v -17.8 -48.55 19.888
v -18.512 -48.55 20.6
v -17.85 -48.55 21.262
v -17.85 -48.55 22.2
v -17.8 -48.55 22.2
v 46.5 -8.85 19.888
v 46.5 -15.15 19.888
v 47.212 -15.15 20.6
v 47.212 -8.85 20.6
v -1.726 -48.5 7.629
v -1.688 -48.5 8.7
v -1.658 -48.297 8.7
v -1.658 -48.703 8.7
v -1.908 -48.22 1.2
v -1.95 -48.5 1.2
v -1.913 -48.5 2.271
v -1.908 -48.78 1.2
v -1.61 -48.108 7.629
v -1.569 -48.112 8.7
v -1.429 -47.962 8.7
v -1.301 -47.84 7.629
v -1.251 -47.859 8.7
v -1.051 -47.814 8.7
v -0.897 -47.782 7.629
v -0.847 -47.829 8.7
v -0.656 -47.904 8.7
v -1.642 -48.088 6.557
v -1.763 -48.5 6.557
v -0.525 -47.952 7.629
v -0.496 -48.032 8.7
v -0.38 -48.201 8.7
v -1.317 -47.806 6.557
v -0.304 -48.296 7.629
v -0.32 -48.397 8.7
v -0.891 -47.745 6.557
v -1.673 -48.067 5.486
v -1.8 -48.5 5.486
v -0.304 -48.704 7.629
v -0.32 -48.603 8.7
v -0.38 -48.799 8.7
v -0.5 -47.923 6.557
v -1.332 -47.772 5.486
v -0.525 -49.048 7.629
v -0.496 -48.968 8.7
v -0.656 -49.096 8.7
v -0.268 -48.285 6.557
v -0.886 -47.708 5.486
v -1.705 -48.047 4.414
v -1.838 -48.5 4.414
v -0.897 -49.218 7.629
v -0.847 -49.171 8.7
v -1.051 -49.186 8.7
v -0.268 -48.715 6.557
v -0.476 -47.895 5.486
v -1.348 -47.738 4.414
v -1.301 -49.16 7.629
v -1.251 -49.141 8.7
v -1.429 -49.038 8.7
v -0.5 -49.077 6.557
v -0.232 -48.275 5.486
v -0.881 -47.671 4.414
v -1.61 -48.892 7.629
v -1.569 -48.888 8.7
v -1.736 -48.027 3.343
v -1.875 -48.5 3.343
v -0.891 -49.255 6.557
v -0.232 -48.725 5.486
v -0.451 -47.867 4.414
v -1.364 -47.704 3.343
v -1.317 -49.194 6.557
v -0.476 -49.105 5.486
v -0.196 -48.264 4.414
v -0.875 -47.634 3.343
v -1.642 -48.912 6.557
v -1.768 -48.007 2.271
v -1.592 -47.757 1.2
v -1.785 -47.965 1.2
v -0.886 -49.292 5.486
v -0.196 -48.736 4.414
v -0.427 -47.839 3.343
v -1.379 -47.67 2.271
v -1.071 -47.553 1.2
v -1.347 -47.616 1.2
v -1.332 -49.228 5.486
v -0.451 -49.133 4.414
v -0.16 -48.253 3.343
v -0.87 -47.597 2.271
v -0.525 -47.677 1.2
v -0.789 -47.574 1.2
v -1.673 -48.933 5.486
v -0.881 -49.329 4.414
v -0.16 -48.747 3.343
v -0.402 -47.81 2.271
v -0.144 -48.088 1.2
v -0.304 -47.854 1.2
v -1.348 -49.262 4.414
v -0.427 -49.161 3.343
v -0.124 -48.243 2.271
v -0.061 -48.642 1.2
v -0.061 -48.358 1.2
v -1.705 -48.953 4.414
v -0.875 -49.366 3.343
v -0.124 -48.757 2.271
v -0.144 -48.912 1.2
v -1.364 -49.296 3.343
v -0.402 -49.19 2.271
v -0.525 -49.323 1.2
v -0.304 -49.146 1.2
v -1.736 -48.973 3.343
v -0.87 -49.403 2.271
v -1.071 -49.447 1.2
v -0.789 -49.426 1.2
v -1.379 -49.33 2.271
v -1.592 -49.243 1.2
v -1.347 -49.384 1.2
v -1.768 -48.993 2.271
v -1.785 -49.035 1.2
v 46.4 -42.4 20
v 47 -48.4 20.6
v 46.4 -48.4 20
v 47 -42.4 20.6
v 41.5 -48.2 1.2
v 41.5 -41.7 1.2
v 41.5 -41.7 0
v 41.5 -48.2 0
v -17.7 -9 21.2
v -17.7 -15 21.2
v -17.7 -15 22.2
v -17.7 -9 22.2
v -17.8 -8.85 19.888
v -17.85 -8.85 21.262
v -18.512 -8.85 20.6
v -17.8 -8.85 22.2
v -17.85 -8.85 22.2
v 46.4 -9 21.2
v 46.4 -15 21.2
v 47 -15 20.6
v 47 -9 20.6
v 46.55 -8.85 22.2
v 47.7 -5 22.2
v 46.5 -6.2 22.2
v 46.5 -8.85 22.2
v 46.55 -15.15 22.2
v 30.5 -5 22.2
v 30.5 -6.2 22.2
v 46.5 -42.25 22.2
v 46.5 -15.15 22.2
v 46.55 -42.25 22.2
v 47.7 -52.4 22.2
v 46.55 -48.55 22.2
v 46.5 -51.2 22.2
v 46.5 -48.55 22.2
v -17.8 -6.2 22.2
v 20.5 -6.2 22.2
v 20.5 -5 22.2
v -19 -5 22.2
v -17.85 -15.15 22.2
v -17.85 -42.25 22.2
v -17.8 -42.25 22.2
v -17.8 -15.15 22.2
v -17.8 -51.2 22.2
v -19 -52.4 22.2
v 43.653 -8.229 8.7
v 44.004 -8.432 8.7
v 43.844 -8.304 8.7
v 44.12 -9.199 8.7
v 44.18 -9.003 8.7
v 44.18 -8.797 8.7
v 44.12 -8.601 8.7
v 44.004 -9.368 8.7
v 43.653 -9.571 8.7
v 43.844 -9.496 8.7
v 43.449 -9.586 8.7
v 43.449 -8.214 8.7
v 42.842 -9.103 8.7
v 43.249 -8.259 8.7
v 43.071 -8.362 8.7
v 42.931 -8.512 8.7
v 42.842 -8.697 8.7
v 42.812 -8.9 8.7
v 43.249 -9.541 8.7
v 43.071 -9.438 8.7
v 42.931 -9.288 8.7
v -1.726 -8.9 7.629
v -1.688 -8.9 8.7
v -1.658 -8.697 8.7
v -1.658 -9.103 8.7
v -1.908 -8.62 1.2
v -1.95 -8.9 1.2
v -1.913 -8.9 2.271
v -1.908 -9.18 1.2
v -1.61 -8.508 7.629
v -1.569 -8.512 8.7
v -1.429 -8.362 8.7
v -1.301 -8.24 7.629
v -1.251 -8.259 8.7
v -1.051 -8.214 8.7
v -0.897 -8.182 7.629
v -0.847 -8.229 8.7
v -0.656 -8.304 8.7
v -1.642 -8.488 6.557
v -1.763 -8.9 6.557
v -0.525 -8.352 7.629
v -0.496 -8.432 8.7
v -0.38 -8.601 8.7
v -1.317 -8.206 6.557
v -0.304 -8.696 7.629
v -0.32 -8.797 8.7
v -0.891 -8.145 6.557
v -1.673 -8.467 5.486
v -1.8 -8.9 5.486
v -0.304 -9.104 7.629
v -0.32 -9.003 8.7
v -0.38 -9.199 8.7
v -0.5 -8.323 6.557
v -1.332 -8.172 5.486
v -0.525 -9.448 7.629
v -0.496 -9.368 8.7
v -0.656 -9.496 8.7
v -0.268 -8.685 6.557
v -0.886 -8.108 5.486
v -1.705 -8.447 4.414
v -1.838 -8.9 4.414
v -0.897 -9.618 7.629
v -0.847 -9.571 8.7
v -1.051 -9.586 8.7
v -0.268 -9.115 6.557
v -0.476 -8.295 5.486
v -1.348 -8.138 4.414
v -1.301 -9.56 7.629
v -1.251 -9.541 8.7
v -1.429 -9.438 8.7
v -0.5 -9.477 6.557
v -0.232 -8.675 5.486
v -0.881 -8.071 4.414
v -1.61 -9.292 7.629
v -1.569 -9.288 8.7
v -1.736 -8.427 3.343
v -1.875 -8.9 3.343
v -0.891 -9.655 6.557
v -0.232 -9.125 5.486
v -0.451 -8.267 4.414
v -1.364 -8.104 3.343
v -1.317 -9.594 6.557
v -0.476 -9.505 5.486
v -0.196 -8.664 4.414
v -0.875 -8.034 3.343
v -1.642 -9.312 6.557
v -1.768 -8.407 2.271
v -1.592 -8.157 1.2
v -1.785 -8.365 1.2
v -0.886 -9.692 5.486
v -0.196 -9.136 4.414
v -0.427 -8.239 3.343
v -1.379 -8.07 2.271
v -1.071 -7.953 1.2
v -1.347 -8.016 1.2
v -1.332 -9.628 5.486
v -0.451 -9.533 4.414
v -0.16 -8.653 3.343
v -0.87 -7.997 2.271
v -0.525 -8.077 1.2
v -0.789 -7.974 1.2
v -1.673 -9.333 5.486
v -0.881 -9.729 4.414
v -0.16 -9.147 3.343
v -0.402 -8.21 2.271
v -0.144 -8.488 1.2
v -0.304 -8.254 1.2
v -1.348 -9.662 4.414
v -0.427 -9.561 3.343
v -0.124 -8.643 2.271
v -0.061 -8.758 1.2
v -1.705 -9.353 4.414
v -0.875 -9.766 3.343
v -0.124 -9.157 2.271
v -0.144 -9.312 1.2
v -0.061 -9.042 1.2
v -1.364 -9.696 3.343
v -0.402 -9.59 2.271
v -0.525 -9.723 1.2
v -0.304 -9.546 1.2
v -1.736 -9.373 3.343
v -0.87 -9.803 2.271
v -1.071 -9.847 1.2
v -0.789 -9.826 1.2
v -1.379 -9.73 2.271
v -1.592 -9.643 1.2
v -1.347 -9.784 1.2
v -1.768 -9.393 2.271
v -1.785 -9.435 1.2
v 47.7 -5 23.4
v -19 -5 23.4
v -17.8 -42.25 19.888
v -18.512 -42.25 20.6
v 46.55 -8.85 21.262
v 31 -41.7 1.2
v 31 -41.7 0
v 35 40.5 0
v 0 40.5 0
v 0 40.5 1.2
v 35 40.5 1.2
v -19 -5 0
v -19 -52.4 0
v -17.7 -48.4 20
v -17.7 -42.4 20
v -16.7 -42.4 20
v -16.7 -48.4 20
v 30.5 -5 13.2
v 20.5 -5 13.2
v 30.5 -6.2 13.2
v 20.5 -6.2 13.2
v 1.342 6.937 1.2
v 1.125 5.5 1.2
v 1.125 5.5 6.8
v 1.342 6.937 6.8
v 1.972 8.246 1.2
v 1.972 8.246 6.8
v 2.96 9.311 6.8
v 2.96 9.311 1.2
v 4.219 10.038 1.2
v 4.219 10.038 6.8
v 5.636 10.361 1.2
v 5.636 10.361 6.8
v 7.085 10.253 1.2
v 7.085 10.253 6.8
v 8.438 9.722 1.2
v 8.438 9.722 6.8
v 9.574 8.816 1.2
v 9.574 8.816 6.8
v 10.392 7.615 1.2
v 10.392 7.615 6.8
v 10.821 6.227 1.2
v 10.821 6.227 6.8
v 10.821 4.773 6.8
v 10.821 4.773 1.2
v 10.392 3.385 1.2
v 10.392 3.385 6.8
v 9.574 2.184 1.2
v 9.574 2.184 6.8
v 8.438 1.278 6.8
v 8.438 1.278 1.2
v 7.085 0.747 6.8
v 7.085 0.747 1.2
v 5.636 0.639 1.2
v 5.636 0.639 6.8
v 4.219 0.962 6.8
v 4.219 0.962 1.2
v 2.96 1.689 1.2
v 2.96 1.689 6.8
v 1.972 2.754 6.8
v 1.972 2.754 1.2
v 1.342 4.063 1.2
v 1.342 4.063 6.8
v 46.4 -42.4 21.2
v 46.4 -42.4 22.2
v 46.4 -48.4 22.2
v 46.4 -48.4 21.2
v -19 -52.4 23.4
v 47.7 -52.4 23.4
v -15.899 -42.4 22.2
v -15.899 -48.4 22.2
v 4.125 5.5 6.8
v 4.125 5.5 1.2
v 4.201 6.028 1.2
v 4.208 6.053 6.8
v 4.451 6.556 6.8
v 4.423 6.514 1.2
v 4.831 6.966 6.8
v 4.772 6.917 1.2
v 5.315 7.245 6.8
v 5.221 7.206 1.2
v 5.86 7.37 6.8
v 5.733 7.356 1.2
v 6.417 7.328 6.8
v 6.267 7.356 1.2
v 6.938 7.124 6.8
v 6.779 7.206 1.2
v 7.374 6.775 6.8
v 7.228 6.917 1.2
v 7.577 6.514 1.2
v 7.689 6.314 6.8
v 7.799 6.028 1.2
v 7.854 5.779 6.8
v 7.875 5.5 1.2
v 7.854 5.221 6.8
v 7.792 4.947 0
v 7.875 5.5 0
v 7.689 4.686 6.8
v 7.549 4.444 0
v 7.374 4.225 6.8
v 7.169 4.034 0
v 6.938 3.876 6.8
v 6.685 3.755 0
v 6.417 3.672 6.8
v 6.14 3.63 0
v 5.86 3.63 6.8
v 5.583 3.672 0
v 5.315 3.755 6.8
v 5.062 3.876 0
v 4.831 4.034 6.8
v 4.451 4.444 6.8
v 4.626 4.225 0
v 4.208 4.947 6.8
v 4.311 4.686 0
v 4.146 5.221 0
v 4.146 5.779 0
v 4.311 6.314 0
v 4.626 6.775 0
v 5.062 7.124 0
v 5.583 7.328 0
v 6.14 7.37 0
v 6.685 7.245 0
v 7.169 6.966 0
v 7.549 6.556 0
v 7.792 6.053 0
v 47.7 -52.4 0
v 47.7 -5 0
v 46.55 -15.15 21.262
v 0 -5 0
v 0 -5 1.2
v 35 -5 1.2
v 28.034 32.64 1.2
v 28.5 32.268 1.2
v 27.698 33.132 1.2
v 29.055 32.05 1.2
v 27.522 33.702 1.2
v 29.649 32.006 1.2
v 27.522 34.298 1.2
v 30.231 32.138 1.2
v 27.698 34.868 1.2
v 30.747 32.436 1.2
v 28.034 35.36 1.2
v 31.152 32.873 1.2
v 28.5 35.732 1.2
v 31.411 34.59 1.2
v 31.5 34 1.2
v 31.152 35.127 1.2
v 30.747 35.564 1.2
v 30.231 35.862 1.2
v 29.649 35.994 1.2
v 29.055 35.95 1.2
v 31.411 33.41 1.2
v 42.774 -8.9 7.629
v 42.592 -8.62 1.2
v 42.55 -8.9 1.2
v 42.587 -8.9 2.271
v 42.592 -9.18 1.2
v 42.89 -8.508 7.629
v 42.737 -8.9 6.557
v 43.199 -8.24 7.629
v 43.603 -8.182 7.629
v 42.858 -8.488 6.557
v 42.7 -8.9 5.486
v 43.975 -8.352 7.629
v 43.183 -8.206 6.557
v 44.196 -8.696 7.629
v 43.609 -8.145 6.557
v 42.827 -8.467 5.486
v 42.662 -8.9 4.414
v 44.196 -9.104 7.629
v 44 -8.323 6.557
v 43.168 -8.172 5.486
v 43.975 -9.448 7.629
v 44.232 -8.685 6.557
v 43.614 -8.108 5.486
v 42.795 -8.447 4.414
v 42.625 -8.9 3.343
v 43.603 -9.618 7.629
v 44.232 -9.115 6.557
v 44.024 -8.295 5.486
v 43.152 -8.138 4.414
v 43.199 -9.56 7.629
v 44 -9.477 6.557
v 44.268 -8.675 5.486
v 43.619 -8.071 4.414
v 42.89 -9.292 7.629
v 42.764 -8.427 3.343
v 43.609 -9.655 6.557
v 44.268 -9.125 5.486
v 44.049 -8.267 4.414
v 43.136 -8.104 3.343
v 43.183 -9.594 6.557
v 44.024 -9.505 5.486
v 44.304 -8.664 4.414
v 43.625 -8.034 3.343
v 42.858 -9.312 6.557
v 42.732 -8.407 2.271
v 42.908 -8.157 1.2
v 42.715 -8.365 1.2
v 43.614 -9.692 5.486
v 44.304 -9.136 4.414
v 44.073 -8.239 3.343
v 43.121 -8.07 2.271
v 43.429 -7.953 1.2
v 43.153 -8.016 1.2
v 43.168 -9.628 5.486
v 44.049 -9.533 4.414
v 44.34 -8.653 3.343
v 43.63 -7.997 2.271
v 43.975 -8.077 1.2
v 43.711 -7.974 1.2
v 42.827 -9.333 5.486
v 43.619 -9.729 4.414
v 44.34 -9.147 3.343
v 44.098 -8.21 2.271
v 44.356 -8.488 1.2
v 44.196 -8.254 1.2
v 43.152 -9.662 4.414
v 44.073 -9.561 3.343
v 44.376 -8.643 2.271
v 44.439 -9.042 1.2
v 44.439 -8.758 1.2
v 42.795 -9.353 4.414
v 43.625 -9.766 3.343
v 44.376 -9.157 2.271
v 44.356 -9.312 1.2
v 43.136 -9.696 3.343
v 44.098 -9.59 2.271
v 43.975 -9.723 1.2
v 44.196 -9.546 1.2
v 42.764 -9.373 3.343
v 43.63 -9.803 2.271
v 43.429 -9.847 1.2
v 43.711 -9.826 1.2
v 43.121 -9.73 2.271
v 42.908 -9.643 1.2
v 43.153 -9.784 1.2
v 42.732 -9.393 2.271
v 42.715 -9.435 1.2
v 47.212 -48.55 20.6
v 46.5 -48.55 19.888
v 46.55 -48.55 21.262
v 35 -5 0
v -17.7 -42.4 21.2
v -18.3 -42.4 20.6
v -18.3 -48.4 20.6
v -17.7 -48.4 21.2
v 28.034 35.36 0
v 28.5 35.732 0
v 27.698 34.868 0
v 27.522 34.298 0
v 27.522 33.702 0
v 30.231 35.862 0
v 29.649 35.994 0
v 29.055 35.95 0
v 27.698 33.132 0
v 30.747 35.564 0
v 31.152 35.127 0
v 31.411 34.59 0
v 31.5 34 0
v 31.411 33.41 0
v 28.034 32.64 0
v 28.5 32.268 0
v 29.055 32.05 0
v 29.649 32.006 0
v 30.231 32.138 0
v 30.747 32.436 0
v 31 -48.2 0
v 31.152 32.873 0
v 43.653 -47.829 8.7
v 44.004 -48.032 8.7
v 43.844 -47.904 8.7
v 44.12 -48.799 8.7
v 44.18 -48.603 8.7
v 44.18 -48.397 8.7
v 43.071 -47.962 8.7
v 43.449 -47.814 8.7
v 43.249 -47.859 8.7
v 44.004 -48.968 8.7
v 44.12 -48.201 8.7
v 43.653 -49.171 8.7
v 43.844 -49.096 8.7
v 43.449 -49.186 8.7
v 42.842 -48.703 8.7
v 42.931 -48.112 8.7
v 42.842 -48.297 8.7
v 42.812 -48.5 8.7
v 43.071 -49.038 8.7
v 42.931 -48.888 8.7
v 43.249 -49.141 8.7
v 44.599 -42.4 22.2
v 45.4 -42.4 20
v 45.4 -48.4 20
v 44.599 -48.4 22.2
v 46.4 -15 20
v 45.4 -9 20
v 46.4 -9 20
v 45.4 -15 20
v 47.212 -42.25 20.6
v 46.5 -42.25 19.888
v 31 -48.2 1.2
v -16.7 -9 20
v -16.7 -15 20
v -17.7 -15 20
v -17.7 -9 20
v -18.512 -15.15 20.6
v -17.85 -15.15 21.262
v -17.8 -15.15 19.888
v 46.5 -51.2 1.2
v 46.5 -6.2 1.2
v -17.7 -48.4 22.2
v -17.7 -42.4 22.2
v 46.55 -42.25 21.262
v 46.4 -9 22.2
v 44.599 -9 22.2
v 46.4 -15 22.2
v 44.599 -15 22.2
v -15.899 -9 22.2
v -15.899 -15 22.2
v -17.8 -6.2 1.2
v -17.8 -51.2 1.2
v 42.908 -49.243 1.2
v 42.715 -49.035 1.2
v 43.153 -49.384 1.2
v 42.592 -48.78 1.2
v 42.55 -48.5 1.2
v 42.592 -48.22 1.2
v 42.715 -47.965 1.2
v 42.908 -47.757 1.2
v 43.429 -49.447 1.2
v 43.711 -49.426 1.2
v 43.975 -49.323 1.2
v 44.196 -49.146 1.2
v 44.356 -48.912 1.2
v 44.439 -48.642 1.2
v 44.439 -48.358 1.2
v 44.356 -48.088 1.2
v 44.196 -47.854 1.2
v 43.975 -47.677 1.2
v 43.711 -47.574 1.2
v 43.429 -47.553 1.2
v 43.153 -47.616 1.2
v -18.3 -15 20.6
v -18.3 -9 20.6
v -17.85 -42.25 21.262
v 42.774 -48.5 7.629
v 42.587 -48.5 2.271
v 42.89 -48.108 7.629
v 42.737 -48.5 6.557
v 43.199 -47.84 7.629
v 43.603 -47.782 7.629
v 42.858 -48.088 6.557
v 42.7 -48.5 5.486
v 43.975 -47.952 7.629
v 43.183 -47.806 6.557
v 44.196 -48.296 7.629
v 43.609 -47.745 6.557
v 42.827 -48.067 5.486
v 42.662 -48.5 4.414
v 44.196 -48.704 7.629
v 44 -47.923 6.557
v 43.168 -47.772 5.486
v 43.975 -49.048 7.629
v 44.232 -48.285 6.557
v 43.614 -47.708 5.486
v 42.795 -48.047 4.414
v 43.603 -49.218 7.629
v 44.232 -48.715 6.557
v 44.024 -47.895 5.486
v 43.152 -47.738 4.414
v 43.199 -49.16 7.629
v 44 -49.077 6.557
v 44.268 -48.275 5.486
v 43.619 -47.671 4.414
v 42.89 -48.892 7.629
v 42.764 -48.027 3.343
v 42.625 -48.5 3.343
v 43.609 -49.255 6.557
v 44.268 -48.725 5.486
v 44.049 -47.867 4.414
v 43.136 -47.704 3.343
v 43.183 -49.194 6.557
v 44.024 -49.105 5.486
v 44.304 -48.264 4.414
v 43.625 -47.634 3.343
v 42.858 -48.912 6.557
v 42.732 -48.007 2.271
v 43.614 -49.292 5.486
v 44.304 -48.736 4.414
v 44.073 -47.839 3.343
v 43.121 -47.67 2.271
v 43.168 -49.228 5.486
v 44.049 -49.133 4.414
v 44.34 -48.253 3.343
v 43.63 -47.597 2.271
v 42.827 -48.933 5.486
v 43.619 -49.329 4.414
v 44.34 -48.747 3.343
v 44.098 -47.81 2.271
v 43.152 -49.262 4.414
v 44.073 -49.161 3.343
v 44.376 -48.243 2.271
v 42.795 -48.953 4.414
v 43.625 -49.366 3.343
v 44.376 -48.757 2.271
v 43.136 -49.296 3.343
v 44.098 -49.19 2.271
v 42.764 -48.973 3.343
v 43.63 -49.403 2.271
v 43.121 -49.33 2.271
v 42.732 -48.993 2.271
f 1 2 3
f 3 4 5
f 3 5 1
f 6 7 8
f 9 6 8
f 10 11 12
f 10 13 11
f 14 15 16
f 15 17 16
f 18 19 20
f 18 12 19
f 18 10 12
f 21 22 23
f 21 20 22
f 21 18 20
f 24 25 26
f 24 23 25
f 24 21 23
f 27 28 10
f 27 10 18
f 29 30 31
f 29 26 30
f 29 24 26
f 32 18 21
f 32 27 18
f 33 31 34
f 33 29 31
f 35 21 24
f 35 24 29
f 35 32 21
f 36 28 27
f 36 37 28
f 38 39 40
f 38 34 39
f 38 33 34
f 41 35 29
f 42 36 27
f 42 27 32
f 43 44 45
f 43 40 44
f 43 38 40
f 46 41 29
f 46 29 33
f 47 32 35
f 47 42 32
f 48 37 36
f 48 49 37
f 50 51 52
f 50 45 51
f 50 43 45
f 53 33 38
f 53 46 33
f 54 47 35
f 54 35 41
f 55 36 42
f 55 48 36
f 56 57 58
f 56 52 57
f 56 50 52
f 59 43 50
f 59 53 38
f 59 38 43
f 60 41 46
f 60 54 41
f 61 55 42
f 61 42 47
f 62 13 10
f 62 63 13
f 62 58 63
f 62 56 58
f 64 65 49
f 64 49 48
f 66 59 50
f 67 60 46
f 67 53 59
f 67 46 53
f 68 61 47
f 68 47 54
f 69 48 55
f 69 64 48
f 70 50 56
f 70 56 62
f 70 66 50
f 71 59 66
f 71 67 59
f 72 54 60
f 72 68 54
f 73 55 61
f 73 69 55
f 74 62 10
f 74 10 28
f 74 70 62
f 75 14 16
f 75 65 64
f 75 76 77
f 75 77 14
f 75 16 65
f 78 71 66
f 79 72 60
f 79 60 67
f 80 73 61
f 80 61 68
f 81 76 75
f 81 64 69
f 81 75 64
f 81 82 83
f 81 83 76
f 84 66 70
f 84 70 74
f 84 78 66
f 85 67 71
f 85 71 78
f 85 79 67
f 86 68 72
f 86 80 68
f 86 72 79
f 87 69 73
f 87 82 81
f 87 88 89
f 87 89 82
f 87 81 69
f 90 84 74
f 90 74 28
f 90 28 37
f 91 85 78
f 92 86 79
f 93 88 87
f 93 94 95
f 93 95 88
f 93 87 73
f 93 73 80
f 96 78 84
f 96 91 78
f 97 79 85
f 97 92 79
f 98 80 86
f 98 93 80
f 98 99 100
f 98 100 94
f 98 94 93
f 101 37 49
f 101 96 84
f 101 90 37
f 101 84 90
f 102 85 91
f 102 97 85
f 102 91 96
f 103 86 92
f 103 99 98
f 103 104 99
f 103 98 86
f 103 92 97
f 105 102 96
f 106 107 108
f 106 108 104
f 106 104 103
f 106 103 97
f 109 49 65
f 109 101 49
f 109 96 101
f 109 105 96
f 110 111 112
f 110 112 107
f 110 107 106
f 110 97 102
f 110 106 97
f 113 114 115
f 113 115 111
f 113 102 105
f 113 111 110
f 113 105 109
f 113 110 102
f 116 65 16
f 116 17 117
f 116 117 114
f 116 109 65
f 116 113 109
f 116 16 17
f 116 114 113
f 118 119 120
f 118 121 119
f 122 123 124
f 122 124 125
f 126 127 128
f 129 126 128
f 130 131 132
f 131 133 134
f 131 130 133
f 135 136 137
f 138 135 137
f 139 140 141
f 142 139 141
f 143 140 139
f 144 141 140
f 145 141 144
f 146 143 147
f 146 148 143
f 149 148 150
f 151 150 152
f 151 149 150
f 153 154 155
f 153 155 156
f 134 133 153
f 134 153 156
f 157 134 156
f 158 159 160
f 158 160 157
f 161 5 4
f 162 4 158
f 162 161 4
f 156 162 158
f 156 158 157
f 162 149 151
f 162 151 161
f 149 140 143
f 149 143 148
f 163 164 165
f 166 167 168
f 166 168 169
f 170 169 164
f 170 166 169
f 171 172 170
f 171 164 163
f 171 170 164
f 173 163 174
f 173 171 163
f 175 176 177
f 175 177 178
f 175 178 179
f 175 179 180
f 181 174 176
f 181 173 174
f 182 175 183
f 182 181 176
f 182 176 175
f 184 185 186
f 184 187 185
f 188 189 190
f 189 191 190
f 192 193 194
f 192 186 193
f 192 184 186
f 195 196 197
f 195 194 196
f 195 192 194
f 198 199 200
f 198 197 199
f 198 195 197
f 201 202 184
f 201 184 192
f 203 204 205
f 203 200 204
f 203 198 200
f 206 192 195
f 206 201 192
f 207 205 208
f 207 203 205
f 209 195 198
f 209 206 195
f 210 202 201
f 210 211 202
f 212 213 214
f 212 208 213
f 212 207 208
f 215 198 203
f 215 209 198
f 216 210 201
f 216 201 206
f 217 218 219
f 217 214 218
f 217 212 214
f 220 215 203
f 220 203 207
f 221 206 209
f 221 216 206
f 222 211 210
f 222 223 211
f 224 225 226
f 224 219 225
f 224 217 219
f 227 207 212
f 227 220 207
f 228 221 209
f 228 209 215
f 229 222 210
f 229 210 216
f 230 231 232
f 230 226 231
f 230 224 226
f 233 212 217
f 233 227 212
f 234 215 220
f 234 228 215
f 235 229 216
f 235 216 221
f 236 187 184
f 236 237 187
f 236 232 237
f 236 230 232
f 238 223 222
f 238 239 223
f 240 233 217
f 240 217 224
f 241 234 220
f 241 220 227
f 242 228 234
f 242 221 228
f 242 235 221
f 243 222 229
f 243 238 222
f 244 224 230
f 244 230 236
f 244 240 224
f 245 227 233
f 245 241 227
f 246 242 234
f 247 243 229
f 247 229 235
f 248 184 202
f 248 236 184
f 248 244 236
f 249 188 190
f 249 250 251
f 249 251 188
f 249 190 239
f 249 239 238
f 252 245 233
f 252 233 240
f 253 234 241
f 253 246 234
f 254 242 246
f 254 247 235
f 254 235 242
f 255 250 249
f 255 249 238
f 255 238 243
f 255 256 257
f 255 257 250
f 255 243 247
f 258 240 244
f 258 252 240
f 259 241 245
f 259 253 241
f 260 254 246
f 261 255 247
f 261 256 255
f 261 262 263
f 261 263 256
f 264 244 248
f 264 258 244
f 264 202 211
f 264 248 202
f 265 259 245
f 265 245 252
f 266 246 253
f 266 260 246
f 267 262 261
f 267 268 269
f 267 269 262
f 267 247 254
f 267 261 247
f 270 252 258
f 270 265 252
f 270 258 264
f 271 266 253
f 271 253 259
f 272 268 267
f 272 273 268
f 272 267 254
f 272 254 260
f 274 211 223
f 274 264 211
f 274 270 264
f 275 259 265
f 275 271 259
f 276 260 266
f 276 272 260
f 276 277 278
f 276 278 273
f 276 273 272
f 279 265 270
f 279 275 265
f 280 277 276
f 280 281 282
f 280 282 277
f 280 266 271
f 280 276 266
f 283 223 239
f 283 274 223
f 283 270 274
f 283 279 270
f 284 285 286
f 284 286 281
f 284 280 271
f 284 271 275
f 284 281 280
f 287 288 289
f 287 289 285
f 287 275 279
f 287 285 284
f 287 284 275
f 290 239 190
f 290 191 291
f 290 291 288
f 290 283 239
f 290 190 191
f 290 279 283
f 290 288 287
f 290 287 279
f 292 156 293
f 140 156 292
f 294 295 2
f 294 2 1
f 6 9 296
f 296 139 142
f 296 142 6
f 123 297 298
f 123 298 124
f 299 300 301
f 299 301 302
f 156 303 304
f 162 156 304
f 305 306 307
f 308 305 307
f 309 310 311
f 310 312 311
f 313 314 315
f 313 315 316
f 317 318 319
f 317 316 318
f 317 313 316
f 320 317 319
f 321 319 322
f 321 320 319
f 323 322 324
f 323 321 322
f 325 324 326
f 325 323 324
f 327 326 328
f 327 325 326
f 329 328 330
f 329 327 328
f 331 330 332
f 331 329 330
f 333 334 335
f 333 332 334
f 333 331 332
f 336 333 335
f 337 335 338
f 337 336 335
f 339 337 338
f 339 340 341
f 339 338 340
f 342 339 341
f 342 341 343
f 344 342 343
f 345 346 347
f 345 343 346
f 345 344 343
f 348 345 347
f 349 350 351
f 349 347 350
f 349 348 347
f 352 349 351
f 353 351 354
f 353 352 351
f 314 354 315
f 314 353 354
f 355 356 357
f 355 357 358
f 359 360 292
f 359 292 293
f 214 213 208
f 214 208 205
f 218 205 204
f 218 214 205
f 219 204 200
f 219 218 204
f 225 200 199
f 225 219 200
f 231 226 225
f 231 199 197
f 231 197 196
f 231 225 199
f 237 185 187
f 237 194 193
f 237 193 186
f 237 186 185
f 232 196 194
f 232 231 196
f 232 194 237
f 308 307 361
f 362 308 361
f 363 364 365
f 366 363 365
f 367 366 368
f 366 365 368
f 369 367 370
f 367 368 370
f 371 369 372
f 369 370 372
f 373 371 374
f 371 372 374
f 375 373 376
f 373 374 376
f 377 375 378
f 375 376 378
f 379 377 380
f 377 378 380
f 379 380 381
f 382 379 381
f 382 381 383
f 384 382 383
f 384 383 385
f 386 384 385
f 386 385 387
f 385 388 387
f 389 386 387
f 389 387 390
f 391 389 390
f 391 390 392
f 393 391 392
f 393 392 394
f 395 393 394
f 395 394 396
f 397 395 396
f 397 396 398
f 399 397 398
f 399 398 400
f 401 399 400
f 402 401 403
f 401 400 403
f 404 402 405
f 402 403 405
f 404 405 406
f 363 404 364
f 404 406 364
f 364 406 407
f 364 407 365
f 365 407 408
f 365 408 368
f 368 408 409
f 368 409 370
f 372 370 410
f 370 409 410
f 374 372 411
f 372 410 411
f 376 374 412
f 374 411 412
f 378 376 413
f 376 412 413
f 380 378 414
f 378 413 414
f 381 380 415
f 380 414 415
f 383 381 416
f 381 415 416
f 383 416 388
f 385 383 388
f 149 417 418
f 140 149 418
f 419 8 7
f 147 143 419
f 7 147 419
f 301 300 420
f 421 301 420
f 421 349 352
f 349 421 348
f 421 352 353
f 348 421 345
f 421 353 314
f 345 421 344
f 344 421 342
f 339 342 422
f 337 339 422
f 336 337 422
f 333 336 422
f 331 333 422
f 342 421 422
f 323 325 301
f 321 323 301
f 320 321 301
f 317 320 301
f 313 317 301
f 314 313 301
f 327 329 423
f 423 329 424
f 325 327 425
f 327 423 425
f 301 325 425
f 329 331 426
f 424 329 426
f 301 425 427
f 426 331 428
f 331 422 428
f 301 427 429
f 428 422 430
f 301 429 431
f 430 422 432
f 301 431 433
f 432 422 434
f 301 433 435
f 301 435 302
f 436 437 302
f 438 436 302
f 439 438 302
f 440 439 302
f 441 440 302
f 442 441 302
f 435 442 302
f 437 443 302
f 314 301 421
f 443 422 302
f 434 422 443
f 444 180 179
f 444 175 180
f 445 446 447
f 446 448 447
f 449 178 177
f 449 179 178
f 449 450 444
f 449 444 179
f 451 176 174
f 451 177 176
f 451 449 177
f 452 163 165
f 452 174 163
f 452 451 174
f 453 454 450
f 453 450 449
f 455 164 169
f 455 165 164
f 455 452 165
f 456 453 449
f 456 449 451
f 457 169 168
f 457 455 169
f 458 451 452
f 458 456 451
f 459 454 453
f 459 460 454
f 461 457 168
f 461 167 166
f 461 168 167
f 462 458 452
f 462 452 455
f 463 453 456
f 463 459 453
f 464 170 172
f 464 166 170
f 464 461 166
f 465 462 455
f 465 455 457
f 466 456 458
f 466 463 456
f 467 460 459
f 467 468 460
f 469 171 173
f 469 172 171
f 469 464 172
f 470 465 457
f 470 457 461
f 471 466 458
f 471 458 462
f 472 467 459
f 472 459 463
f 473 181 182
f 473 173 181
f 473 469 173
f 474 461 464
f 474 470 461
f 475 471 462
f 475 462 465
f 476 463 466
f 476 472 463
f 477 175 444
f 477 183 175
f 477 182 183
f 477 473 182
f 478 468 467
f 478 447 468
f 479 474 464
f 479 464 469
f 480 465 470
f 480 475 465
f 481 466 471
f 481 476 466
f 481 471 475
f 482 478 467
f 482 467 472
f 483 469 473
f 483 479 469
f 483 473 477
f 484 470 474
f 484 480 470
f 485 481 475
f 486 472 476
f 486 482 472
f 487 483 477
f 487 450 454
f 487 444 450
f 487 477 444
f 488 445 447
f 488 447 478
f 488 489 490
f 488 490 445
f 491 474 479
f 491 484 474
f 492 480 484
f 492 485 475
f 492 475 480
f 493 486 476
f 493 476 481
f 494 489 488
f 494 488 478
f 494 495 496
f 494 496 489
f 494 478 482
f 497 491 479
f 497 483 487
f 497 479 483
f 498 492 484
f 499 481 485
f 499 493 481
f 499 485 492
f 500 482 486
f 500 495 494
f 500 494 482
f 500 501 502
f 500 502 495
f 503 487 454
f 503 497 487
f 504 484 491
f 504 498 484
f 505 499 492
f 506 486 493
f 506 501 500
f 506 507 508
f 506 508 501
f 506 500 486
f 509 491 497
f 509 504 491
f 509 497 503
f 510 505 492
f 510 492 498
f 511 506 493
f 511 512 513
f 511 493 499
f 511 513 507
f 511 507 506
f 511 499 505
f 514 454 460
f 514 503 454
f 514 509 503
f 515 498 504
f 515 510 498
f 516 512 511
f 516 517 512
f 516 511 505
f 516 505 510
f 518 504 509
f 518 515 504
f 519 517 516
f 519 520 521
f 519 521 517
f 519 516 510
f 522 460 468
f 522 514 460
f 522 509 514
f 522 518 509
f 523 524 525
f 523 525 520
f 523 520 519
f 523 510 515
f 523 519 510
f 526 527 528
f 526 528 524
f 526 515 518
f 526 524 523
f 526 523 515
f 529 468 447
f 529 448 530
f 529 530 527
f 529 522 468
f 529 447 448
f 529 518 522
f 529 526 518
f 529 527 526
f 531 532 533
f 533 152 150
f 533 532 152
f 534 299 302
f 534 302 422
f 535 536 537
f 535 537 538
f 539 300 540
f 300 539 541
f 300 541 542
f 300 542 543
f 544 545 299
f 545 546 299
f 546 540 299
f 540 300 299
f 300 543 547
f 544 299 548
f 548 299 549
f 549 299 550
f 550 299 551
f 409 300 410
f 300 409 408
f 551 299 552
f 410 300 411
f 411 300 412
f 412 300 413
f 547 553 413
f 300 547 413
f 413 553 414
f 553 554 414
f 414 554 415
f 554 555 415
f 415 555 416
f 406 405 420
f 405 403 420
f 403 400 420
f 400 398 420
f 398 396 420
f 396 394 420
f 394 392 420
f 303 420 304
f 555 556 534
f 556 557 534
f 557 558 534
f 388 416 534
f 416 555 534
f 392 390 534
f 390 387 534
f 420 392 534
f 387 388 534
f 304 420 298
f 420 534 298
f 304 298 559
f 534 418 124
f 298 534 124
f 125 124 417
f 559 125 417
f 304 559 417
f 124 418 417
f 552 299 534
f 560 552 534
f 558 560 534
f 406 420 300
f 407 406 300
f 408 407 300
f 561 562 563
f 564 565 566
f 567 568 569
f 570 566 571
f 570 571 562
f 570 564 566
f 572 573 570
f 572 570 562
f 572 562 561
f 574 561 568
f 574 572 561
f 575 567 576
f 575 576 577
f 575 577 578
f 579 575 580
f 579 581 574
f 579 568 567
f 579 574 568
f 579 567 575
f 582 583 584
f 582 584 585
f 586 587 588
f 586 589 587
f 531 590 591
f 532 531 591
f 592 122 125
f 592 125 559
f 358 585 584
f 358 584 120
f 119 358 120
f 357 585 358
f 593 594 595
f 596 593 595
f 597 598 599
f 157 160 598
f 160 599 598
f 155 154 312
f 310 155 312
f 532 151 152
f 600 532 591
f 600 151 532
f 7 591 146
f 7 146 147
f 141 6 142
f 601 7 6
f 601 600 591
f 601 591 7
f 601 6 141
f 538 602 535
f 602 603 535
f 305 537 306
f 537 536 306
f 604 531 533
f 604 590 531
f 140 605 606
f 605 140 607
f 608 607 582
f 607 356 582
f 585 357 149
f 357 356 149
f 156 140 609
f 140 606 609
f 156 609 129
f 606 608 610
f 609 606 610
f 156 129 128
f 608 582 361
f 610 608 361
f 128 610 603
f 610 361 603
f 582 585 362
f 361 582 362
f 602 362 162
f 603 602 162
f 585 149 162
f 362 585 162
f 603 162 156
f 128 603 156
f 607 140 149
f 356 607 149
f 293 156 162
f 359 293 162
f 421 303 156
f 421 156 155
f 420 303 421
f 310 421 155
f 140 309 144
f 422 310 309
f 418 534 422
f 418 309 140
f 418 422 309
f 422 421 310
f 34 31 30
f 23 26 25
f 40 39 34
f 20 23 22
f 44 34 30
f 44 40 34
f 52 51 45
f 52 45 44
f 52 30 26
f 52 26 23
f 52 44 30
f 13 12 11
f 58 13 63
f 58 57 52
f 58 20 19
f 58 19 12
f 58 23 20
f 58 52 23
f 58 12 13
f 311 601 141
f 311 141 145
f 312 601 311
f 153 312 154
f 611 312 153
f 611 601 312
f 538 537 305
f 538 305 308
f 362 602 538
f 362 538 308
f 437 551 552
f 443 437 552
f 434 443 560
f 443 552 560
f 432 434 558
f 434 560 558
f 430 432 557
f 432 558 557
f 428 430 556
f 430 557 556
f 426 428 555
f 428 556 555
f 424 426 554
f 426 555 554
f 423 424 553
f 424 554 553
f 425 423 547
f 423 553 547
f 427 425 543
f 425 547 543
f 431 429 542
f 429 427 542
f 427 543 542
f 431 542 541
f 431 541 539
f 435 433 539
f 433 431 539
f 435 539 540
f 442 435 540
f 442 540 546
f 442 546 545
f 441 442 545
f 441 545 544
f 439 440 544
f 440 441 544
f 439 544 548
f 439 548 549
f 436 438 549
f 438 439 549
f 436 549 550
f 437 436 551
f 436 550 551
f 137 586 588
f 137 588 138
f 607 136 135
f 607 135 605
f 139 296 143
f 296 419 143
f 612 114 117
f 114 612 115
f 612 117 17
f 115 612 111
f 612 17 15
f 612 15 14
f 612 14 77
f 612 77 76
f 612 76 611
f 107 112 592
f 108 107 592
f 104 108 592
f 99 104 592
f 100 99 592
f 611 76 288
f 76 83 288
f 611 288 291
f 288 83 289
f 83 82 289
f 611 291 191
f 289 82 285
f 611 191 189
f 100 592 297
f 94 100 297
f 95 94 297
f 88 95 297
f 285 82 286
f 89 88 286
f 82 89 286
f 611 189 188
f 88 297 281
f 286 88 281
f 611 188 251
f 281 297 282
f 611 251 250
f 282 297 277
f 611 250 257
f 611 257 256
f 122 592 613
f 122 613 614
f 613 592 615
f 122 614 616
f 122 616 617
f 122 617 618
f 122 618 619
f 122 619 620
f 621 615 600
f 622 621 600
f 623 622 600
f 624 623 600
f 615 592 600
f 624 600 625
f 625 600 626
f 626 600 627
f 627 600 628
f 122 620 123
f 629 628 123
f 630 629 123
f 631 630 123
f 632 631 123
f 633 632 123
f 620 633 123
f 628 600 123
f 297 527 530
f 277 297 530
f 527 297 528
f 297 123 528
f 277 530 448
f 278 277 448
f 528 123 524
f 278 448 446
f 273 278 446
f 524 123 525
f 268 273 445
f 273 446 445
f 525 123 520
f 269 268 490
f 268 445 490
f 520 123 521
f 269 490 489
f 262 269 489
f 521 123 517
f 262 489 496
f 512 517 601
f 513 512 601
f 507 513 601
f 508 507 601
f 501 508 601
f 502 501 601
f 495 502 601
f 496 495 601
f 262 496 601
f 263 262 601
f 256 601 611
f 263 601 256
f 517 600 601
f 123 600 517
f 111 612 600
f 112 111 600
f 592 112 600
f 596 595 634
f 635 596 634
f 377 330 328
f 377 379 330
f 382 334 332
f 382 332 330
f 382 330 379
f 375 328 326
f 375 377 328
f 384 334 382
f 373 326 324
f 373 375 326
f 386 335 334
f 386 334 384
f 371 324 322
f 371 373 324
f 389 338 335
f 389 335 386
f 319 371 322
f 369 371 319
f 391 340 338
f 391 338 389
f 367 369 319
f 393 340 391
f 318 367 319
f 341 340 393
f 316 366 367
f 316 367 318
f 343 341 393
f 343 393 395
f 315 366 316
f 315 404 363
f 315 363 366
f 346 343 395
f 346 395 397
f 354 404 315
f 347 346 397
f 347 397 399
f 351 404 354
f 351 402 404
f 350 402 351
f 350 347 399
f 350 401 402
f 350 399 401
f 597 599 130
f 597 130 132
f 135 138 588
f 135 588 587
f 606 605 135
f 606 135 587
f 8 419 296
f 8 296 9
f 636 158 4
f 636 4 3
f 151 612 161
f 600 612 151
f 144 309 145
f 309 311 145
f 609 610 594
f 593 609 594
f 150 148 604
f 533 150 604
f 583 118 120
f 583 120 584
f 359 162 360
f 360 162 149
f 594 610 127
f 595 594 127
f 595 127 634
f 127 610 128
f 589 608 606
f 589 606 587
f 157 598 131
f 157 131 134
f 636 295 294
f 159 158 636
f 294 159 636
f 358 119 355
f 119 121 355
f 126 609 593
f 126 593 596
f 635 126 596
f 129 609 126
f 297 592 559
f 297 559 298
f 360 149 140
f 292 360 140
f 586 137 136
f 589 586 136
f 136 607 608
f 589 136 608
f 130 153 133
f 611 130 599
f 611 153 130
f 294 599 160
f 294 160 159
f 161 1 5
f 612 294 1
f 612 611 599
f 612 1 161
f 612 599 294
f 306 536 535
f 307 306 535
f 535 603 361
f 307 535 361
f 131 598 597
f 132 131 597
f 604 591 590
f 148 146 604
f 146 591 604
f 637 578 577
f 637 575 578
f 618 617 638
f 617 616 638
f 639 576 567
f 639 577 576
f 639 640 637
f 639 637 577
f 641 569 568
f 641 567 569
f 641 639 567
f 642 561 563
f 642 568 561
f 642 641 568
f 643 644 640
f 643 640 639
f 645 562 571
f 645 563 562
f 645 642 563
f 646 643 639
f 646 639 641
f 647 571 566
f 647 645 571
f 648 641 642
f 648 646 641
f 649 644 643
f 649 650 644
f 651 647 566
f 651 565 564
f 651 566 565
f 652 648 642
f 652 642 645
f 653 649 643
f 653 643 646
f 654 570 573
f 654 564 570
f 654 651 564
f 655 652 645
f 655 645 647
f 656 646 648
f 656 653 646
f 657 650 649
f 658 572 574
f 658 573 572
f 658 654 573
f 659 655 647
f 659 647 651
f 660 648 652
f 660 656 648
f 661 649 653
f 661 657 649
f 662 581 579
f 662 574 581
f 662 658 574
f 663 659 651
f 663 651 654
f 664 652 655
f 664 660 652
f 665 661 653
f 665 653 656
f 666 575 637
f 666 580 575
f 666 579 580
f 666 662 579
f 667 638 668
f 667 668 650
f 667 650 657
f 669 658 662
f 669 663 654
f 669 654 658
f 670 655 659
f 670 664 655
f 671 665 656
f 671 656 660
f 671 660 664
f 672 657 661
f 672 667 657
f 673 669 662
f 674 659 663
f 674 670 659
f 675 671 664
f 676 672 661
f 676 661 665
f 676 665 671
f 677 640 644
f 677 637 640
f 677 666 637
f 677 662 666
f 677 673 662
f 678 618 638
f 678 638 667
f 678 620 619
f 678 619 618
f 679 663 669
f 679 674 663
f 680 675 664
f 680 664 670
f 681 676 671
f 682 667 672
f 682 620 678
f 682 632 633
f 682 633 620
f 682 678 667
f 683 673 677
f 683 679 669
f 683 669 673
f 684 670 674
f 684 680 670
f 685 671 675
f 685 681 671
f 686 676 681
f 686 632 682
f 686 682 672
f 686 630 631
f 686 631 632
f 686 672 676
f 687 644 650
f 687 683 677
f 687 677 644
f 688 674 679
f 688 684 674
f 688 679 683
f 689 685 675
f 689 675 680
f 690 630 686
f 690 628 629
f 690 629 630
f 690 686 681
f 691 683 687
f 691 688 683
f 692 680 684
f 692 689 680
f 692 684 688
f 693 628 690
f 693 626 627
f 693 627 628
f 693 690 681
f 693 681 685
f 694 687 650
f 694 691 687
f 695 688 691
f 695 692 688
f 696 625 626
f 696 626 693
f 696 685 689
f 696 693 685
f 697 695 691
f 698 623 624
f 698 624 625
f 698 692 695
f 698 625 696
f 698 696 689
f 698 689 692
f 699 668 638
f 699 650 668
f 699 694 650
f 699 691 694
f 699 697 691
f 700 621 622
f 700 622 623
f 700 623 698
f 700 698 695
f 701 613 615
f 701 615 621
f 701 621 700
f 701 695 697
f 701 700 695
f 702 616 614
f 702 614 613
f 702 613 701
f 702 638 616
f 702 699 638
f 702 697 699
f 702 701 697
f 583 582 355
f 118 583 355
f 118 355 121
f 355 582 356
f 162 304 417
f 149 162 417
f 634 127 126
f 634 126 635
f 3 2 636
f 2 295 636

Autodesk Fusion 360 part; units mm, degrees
sketch "Sketch1" plane through (0, 0, 0) normal (0, 0, 1) x (1, 0, 0)
  line L0 (0, 0) -> (35, 0) construction
  line L1 (35, 0) -> (35, 40.5) construction
  line L2 (35, 40.5) -> (0, 40.5) construction
  line L3 (0, 40.5) -> (0, 0) construction
  line L4 (0, 0) -> (6, 0) construction
  line L5 (6, 0) -> (6, 5.5) construction
  line L6 (6, 5.5) -> (0, 5.5) construction
  line L7 (0, 5.5) -> (0, 0) construction
  line L8 (35, 40.5) -> (29.5, 40.5) construction
  line L9 (29.5, 40.5) -> (29.5, 34) construction
  line L10 (29.5, 34) -> (35, 34) construction
  line L11 (35, 34) -> (35, 40.5) construction
  circle A0 centre (29.5, 34) radius 2
  circle A1 centre (6, 5.5) radius 1.875
  line L12 (0, 40.5) -> (11.5, 40.5) construction
  line L13 (11.5, 40.5) -> (11.5, 0) construction
  line L14 (11.5, 0) -> (11.5, -5) construction
  line L15 (11.5, -5) -> (36.5, -5) construction
  line L16 (36.5, -5) -> (36.5, 48) construction
  line L17 (36.5, 48) -> (11.5, 48) construction
  line L18 (11.5, 48) -> (11.5, -5) construction
  line L19 (36.5, -5) -> (46.5, -5) construction
  line L20 (46.5, -5) -> (-17.5, -5)
  line L21 (-17.5, -5) -> (-17.5, -50)
  line L22 (-17.5, -50) -> (46.5, -50)
  line L23 (46.5, -50) -> (46.5, -5)
  line L24 (0, 40.5) -> (0, -5)
  line L25 (0, 40.5) -> (35, 40.5)
  line L26 (35, 40.5) -> (35, -5)
  dimension "d1" = 35
  dimension "d2" = 40.5
  dimension "d3" = 6
  dimension "d4" = 5.5
  dimension "d5" = 5.5
  dimension "d6" = 6.5
  dimension "d7" = 4
  dimension "d8" = 3.75
  dimension "d9" = 11.5
  dimension "d10" = 5
  dimension "d11" = 25
  dimension "d12" = 53
  dimension "d13" = 10
  dimension "d14" = 64
  dimension "d15" = 45
extrude "Extrude1" add sketch "Sketch1" along normal blind 1.2 makes body 1
sketch "Sketch2" plane through (0, 0, 1.2) normal (0, 0, 1) x (-1, 0, 0)
  circle A0 centre (-6, -5.5) radius 1.875
  circle A1 centre (-29.5, -34) radius 2
  line L0 (0, -40.5) -> (0, 5)
  line L1 (0, 5) -> (17.5, 5)
  line L2 (17.5, 5) -> (17.5, 50)
  line L3 (17.5, 50) -> (-46.5, 50)
  line L4 (-46.5, 50) -> (-46.5, 5)
  line L5 (-46.5, 5) -> (-35, 5)
  line L6 (-35, 5) -> (-35, -40.5)
  line L7 (-35, -40.5) -> (0, -40.5)
  circle A2 centre (-6, -5.5) radius 4.875
  line L8 (17.5, 5) -> (-46.5, 5)
  line L9 (-46.5, 5) -> (-46.5, 50)
  line L10 (-46.5, 50) -> (17.5, 50)
  line L11 (17.5, 50) -> (17.5, 5)
  dimension "d18" = 3
extrude "Extrude2" add sketch "Sketch2" along normal blind 5.6 contours A2 bodies 1
extrude "Extrude3" add 1 faces at (3.8333, -50, 0.4) along direction (0, -1, 0) blind 2.4 on bodies 1 bodies 1
extrude "Extrude4" add 1 faces at (46.5, -36.6, 0.8) along direction (1, 0, 0) blind 1.2 on bodies 1 bodies 1
extrude "Extrude5" add 1 faces at (-17.5, -36.6, 0.8) along direction (-1, 0, 0) blind 1.5 on bodies 1 bodies 1
sketch "Sketch3" plane through (0, 0, 1.2) normal (0, 0, 1) x (-1, 0, 0)
  circle A0 centre (-6, -5.5) radius 4.875
  circle A1 centre (-29.5, -34) radius 2
  line L0 (0, -40.5) -> (0, 5)
  line L1 (0, 5) -> (19, 5)
  line L2 (19, 5) -> (19, 52.4)
  line L3 (19, 52.4) -> (-47.7, 52.4)
  line L4 (-47.7, 52.4) -> (-47.7, 5)
  line L5 (-47.7, 5) -> (-35, 5)
  line L6 (-35, 5) -> (-35, -40.5)
  line L7 (-35, -40.5) -> (0, -40.5)
  line L8 (0, 5) -> (-35, 5)
  line L9 (0, 6.2) -> (-35, 6.2)
  line L10 (-46.5, 6.2) -> (-35, 6.2)
  line L11 (-46.5, 51.2) -> (-46.5, 6.2)
  line L12 (17.8, 51.2) -> (-46.5, 51.2)
  line L13 (17.8, 6.2) -> (17.8, 51.2)
  line L14 (0, 6.2) -> (17.8, 6.2)
  line L15 (-46.5, 51.2) -> (-46.5, 48.2) construction
  line L16 (-46.5, 48.2) -> (-41.5, 48.2) construction
  line L17 (-41.5, 48.2) -> (-31, 48.2)
  line L18 (-31, 48.2) -> (-31, 41.7)
  line L19 (-31, 41.7) -> (-41.5, 41.7)
  line L20 (-41.5, 41.7) -> (-41.5, 48.2)
  line L21 (-46.5, 51.2) -> (-46.5, 48.5) construction
  line L22 (-46.5, 48.5) -> (-43.5, 48.5) construction
  circle A2 centre (-43.5, 48.5) radius 0.95
  line L23 (-46.5, 6.2) -> (-43.5, 6.2) construction
  line L24 (-43.5, 6.2) -> (-43.5, 8.9) construction
  line L25 (-43.5, 8.9) -> (-46.5, 8.9) construction
  line L26 (-46.5, 8.9) -> (-46.5, 6.2) construction
  circle A3 centre (-43.5, 8.9) radius 0.95
  line L27 (-43.5, 8.9) -> (1, 8.9) construction
  line L28 (-43.5, 48.5) -> (1, 48.5) construction
  circle A4 centre (1, 8.9) radius 0.95
  circle A5 centre (1, 48.5) radius 0.95
  dimension "d27" = -1.2
  dimension "d28" = 3
  dimension "d29" = 5
  dimension "d30" = 10.5
  dimension "d31" = 6.5
  dimension "d32" = 2.7
  dimension "d33" = 3
  dimension "d34" = 1.9
  dimension "d35" = 3
  dimension "d36" = 2.7
  dimension "d37" = 1.9
  dimension "d38" = 44.5
  dimension "d39" = 44.5
  dimension "d40" = 1.9
  dimension "d41" = 1.9
extrude "Extrude6" cut sketch "Sketch3" against normal blind 1.2 contours L17 L18 L19 L20 bodies 1
extrude "Extrude7" add sketch "Sketch3" along normal blind 21 contours L1 L2 L3 L4 L5 L8 bodies 1
extrude "Extrude8" add sketch "Sketch3" along normal blind 7.5 draft -2 contours A2 | A3 | A4 | A5 bodies 1
sketch "Sketch4" plane through (0, -6.2, 0) normal (0, -1, 0) x (1, 0, 0)
  line L0 (35, 1.2) -> (46.5, 1.2)
  line L1 (46.5, 1.2) -> (46.5, 22.2)
  line L2 (46.5, 22.2) -> (35, 22.2)
  line L3 (35, 22.2) -> (35, 1.2)
  line L4 (46.5, 22.2) -> (30.5, 22.2)
  line L5 (30.5, 22.2) -> (20.5, 22.2)
  line L6 (20.5, 22.2) -> (20.5, 13.2)
  line L7 (20.5, 13.2) -> (30.5, 13.2)
  line L8 (30.5, 13.2) -> (30.5, 22.2)
  dimension "d48" = 16
  dimension "d49" = 9
  dimension "d50" = 10
extrude "Extrude9" cut sketch "Sketch4" against normal blind 1.2 contours L5 L6 L7 L8 bodies 1
extrude "Extrude10" add sketch "Sketch3" along normal blind 1.2 from surface at 21 separate body contours L1 L2 L3 L4 L5 L8 | L9 L10 L11 L12 L13 L14 | L17 L18 L19 L20 | A2 | A3 | A4 | A5 makes body 2
sketch "Sketch5" plane through (0, -52.4, 0) normal (0, -1, 0) x (1, 0, 0)
  line L0 (-19, 22.2) -> (47.7, 22.2)
  line L1 (47.7, 22.2) -> (47.7, 23.4)
  line L2 (47.7, 23.4) -> (-19, 23.4)
  line L3 (-19, 23.4) -> (-19, 22.2)
  line L4 (-19, 22.2) -> (-17.7, 22.2) construction
  line L5 (-17.7, 22.2) -> (-17.7, 21.2)
  line L6 (-17.7, 21.2) -> (-17.7, 20.6) construction
  line L7 (-17.7, 20.6) -> (-17.7, 20) construction
  line L8 (-17.7, 20.6) -> (-18.3, 20.6) construction
  line L9 (-18.3, 20.6) -> (-17.7, 21.2)
  line L10 (-18.3, 20.6) -> (-17.7, 20)
  line L11 (-17.7, 20) -> (-16.7, 20)
  line L12 (-16.7, 20) -> (-15.8993, 22.2)
  line L13 (-16.7, 20) -> (-14.3588, 20) construction
  line L14 (-19, 22.2) -> (14.35, 22.2) construction
  line L15 (14.35, 22.2) -> (14.35, 12) construction
  line L16 (-17.85, 22.2) -> (-17.85, 21.2621)
  line L17 (-18.5121, 20.6) -> (-17.85, 21.2621)
  line L18 (-18.5121, 20.6) -> (-17.7621, 19.85)
  line L19 (-17.7621, 19.85) -> (-16.595, 19.85)
  line L20 (-16.595, 19.85) -> (-15.7583, 22.1487)
  line L21 (-15.7583, 22.1487) -> (-15.74, 22.2)
  line L22 (46.4, 22.2) -> (46.4, 21.2)
  line L23 (46.55, 22.2) -> (46.55, 21.2621)
  line L24 (47.2121, 20.6) -> (46.55, 21.2621)
  line L25 (47, 20.6) -> (46.4, 21.2)
  line L26 (47.2121, 20.6) -> (46.4621, 19.85)
  line L27 (47, 20.6) -> (46.4, 20)
  line L28 (46.4621, 19.85) -> (45.295, 19.85)
  line L29 (46.4, 20) -> (45.4, 20)
  line L30 (45.295, 19.85) -> (44.4583, 22.1487)
  line L31 (45.4, 20) -> (44.5993, 22.2)
  line L32 (44.4583, 22.1487) -> (44.44, 22.2)
  dimension "d56" = 1.3
  dimension "d57" = 1
  dimension "d58" = 0.6
  dimension "d59" = 0.6
  dimension "d60" = 0.6
  dimension "d61" = 1
  dimension "d62" = 70
  dimension "d63" = 0.15
sketch "Sketch6" plane through (0, 0, 22.2) normal (0, 0, -1) x (1, 0, 0)
  line L0 (-19, 52.4) -> (-19, 5)
  line L1 (-19, 5) -> (0, 5)
  line L2 (0, 5) -> (35, 5)
  line L3 (35, 5) -> (47.7, 5)
  line L4 (47.7, 5) -> (47.7, 52.4)
  line L5 (47.7, 52.4) -> (-19, 52.4)
  line L6 (-19, 28.7) -> (-18, 28.7)
  line L7 (-18, 28.7) -> (47.7, 28.7) construction
extrude "Extrude11" add sketch "Sketch5" along normal blind 6 from surface at -10 separate body contours L0 L5 L9 L10 L11 L12 | L0 L22 L25 L27 L29 L31 makes body 3 at (-16.4331, -44.4, 20.7333) makes body 4 at (45.1331, -44.4, 20.7333)
ref_plane "WorkPlane1" through (14.35, -28.7, 22.8) normal (0, -1, 0) x (1, 0, 0)
mirror "Mirror1" about plane through (14.35, -28.7, 22.8) normal (0, -1, 0) of bodies 3 4 makes body 5 at (-16.4331, -13, 20.7333) makes body 6 at (45.1331, -13, 20.7333)
combine "Combine1" operation add target body 6 tool bodies 5 3 4 2
extrude "Extrude12" add sketch "Sketch5" along normal blind 6.3 from surface at -10.15 separate body contours L0 L5 L9 L10 L11 L12 L16 L17 L18 L19 L20 L21 | L0 L5 L9 L10 L11 L12 | L0 L22 L23 L24 L25 L26 L27 L28 L29 L30 L31 L32 | L0 L22 L25 L27 L29 L31 makes body 7 at (45.0161, -44.35, 20.6162) makes body 8 at (-16.3161, -44.35, 20.6162)
mirror "Mirror2" about plane through (14.35, -28.7, 22.8) normal (0, -1, 0) of bodies 8 7 makes body 9 at (-16.3161, -13.05, 20.6162) makes body 10 at (45.0161, -10.95, 20.6162)
combine "Combine2" operation cut target body 1 tool bodies 7 8 9 10
equation "d49 = 21 mm - 12 mm"
